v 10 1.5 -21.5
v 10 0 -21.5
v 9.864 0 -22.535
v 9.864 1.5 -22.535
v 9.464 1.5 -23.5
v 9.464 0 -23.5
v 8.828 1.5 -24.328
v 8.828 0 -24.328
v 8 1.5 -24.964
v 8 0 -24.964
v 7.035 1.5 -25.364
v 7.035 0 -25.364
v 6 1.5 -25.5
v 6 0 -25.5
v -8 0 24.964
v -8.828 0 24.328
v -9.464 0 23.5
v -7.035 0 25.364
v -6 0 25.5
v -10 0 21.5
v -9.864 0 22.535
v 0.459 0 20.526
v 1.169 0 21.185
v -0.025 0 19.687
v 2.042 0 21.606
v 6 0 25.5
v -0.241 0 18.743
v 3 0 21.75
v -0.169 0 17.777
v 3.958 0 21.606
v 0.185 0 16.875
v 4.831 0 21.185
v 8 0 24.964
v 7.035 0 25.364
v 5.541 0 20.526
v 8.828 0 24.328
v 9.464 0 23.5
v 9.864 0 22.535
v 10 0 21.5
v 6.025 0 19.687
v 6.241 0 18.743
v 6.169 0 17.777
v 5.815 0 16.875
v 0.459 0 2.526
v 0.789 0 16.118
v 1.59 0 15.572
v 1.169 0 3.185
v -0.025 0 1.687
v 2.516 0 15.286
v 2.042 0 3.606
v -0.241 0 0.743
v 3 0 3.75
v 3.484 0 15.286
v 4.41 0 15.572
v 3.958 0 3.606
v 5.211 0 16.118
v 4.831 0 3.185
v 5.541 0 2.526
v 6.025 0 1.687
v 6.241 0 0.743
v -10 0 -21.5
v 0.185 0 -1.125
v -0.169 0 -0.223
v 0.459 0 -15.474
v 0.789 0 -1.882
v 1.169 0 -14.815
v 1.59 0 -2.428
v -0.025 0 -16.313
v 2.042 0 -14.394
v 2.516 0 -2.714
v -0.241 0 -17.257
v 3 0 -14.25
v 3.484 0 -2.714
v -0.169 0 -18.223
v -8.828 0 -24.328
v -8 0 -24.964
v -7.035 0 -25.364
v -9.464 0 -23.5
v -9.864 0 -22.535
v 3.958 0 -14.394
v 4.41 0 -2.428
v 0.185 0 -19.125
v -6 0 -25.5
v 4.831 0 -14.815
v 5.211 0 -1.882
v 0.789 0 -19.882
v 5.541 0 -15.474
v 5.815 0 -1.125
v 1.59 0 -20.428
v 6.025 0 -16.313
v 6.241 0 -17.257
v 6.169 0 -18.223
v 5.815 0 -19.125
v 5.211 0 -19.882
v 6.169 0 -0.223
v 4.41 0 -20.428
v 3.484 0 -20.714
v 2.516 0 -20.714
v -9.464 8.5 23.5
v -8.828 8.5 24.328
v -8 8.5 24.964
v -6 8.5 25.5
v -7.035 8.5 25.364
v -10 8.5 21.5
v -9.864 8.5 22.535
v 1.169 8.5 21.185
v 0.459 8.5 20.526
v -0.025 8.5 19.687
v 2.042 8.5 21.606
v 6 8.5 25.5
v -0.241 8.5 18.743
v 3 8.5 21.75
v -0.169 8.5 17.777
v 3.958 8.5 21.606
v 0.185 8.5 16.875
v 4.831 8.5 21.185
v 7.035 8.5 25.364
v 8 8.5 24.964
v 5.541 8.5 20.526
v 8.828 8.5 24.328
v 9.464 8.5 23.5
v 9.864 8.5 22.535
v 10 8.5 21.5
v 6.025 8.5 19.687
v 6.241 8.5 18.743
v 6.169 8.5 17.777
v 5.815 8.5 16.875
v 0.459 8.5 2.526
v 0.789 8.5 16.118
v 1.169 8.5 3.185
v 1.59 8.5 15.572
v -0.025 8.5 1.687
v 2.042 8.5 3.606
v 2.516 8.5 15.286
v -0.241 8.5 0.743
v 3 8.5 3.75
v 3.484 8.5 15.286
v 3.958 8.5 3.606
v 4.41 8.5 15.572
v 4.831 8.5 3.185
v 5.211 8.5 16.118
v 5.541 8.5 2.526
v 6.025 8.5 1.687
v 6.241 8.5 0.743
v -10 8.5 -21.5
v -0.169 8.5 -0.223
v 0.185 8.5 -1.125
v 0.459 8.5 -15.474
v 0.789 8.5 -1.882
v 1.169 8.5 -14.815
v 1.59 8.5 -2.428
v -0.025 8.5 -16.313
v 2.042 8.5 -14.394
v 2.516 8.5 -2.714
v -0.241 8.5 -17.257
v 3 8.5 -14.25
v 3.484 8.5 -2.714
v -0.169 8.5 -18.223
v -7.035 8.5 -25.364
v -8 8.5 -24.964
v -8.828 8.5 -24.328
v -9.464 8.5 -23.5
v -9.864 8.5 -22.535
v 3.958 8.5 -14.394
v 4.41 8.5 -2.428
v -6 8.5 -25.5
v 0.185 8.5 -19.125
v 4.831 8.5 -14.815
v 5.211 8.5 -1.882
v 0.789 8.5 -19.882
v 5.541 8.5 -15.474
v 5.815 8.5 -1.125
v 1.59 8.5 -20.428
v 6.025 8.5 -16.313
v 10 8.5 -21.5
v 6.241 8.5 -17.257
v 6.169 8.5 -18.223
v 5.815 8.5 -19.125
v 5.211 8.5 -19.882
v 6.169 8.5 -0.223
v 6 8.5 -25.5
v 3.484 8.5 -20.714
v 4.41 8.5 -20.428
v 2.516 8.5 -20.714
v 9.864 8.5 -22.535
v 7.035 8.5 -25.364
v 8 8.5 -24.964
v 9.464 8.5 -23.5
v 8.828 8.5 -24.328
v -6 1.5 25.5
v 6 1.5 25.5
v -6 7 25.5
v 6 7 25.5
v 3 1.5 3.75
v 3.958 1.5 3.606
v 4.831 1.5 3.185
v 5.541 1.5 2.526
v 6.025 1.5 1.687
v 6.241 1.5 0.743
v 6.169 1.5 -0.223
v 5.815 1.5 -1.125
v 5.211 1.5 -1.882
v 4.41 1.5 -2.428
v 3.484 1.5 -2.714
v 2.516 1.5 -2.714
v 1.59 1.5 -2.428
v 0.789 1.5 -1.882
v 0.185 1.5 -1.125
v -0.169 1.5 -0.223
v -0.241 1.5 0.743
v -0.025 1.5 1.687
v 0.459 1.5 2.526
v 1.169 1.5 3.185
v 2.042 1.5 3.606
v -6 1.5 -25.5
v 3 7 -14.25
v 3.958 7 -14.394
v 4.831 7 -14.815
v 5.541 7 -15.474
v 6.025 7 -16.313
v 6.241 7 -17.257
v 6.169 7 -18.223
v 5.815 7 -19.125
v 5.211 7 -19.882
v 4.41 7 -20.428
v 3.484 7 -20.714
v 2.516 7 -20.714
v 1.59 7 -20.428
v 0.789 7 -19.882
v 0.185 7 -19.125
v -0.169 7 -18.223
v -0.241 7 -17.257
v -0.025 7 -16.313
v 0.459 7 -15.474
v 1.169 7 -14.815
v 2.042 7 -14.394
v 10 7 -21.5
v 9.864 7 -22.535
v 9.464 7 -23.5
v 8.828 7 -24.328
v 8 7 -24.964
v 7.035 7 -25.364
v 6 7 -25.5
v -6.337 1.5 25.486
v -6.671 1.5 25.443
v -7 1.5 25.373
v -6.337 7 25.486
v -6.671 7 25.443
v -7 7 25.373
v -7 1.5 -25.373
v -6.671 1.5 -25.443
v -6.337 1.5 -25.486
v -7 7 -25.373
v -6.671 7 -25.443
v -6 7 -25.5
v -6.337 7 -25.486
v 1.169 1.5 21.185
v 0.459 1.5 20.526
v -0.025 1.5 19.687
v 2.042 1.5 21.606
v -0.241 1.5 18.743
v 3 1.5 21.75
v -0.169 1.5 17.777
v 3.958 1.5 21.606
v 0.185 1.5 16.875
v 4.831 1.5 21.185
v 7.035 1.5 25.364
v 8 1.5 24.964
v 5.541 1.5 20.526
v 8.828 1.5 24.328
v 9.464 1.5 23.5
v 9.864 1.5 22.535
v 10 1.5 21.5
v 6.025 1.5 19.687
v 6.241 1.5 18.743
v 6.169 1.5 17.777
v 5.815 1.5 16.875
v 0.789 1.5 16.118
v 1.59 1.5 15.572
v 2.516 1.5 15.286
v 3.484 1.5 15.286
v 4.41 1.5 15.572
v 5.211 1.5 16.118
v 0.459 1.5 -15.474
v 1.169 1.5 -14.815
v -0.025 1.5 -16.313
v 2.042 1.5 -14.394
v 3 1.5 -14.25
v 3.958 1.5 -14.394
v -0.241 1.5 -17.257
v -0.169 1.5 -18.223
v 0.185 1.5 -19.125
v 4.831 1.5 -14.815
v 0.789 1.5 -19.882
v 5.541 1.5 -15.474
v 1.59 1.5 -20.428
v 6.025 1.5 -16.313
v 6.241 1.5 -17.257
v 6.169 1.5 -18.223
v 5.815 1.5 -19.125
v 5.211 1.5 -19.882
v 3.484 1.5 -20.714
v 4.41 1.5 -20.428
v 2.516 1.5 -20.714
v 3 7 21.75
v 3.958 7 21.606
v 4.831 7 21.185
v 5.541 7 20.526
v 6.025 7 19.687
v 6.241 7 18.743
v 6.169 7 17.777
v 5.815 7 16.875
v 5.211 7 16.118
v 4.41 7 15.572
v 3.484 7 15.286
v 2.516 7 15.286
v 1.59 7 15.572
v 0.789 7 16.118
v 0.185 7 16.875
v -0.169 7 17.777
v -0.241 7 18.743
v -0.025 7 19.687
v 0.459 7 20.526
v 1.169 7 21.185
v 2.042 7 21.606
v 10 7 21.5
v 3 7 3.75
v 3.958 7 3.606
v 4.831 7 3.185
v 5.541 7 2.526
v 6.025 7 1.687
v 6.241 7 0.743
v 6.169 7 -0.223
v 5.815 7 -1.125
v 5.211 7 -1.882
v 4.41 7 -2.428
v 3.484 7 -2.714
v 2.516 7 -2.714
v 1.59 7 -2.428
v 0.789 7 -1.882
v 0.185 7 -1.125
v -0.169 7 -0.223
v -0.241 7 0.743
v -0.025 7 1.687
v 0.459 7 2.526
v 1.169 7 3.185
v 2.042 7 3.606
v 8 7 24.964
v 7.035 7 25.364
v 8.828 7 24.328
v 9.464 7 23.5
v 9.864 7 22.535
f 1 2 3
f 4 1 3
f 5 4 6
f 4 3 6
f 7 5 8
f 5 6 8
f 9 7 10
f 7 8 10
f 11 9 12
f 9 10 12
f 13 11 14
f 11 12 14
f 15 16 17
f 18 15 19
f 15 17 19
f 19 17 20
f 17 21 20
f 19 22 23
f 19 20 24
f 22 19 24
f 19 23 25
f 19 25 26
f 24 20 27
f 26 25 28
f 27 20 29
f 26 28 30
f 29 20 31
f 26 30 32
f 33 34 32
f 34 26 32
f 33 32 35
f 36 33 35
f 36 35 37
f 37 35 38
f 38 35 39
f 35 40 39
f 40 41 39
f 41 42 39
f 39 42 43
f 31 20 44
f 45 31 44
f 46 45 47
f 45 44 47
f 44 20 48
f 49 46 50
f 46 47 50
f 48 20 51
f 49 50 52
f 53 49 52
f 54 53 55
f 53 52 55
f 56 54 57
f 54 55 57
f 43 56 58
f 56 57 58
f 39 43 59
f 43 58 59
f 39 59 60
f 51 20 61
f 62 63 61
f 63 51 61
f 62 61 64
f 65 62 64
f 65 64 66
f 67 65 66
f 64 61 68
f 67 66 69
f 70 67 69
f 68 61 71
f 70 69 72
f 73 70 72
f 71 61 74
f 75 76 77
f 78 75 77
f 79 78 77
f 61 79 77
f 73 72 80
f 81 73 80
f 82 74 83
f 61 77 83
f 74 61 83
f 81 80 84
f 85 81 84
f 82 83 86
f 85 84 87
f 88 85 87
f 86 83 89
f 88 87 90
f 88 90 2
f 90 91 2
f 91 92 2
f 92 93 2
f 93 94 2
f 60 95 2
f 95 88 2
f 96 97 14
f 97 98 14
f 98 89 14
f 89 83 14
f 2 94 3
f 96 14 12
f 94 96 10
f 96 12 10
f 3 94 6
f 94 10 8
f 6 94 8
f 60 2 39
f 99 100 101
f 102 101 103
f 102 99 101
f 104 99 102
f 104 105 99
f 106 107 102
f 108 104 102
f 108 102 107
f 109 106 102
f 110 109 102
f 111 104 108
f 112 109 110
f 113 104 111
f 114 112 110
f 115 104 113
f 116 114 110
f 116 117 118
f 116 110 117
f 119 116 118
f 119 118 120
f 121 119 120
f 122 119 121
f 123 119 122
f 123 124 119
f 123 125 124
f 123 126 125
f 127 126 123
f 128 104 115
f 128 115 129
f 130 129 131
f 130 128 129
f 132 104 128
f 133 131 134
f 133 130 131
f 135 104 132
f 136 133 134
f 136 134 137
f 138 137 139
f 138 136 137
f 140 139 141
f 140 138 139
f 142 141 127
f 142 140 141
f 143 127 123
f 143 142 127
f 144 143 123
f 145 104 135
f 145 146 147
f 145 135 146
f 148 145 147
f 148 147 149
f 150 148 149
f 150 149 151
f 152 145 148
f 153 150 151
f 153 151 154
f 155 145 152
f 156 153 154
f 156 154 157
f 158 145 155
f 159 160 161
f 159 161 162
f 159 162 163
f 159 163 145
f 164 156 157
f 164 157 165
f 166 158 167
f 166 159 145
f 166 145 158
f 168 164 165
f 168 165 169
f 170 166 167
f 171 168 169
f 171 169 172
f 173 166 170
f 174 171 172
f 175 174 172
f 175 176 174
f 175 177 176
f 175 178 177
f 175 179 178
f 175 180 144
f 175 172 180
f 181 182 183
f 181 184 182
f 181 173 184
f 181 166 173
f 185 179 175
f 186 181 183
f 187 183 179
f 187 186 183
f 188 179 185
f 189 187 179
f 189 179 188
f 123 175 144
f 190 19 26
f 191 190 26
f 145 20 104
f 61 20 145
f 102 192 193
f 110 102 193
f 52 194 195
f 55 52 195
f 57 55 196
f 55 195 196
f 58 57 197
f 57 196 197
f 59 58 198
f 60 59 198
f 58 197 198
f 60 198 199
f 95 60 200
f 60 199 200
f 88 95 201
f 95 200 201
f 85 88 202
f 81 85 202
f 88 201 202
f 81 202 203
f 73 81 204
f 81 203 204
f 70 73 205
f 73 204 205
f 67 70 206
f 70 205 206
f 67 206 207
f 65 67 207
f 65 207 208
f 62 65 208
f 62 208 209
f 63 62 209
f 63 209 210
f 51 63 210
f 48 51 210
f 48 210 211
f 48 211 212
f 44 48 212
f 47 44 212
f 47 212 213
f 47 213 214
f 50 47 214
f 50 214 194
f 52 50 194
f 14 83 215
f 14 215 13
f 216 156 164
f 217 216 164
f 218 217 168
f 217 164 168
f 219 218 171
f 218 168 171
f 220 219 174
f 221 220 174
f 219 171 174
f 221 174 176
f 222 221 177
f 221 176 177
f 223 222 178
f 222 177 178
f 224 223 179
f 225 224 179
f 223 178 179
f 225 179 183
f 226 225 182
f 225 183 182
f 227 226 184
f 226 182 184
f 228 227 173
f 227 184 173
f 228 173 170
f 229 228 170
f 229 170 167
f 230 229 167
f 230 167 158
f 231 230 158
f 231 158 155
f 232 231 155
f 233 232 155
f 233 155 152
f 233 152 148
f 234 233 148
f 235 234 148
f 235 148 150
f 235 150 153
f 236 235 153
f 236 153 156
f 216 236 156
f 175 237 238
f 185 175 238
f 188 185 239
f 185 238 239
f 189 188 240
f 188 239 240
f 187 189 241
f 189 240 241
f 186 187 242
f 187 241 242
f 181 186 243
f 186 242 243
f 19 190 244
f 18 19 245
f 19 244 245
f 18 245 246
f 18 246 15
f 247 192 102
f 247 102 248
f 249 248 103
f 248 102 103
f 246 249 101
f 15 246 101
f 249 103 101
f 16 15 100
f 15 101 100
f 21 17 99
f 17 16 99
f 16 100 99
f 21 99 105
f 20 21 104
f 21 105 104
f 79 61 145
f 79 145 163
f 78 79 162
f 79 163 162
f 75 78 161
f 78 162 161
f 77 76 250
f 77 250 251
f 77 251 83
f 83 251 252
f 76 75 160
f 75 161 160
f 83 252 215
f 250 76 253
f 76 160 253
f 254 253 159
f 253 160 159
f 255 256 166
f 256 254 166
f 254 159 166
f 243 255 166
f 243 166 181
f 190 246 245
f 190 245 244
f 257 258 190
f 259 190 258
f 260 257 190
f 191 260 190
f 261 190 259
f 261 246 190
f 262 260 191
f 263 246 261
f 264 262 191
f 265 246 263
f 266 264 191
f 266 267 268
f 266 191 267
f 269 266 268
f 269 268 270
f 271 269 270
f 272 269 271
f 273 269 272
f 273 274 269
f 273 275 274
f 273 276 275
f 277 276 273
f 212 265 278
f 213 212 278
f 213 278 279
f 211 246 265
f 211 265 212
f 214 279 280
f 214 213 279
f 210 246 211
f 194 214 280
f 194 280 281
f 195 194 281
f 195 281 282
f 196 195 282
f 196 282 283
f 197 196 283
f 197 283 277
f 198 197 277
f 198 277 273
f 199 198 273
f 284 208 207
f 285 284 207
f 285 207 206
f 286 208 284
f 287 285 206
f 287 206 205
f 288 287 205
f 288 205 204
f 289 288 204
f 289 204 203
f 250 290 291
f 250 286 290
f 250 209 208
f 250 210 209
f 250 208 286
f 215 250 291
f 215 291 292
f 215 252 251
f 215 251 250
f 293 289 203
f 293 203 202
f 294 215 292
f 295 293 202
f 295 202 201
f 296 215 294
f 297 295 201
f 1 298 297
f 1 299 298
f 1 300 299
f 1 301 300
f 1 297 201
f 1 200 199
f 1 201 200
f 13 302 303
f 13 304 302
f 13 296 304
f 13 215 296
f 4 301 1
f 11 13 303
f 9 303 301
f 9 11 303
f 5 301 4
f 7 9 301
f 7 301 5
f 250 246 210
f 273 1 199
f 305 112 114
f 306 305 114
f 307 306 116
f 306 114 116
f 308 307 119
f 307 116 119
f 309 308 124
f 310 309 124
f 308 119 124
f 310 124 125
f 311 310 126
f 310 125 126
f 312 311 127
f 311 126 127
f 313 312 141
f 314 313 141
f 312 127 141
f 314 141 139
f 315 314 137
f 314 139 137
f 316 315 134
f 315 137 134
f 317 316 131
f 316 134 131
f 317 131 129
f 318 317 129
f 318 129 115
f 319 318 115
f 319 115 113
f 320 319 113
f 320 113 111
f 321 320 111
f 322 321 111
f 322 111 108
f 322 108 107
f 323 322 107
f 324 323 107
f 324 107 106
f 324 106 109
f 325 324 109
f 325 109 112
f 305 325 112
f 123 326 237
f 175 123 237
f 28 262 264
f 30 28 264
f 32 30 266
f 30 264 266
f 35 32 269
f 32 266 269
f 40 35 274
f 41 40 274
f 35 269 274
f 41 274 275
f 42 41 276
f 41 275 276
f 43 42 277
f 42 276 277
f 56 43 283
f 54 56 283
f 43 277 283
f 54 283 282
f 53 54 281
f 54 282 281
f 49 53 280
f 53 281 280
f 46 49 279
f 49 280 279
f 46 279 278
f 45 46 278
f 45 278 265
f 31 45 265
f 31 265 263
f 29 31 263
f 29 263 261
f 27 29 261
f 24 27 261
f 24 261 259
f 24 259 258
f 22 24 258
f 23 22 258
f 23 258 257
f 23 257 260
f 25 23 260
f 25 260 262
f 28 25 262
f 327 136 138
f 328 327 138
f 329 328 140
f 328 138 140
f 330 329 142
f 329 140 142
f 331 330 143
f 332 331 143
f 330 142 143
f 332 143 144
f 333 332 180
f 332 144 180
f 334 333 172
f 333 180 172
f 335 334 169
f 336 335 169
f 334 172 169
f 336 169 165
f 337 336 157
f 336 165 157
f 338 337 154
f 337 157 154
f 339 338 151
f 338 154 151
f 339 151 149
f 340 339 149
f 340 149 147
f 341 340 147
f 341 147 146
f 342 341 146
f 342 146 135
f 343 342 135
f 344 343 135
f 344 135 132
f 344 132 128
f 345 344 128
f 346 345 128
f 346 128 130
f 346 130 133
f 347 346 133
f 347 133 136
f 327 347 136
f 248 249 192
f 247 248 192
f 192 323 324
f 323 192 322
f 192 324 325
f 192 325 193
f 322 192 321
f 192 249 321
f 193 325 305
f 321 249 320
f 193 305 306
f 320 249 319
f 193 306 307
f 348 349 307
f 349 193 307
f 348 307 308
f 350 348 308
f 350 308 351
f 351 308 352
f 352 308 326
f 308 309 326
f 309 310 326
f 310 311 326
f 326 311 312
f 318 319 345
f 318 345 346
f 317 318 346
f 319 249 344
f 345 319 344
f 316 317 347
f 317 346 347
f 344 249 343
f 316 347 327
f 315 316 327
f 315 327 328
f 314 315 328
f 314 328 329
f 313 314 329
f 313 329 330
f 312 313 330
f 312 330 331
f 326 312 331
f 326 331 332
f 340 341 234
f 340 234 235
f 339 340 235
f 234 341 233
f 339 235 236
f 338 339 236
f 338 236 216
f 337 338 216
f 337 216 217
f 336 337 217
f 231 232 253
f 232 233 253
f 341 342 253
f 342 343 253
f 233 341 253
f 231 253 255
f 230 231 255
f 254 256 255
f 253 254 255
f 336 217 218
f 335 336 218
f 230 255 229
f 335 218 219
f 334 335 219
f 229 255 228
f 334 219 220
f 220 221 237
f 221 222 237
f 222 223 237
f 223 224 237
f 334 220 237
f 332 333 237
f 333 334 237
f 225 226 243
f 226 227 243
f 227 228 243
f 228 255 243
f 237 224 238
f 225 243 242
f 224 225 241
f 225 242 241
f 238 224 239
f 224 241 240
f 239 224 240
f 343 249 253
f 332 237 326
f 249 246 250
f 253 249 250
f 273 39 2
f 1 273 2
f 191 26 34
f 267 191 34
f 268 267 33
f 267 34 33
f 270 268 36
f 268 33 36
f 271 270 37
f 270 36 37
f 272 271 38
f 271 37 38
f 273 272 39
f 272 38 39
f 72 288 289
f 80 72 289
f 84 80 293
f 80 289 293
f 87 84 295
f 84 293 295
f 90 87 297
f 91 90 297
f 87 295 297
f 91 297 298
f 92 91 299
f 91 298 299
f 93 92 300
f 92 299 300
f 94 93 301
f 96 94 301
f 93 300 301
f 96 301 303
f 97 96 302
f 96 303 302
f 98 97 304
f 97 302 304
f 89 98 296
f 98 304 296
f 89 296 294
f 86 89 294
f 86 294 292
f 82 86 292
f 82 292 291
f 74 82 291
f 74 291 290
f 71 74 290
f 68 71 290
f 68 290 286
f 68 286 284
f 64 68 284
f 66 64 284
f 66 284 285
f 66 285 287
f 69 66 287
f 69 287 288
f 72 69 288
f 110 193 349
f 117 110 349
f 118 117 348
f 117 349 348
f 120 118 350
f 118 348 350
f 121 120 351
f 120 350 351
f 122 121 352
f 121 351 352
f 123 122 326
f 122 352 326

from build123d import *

# Parameters (mm, degrees)
SKETCH1_W           = 20
SKETCH1_H           = 51
BOSS_EXTRUDE1_DEPTH = 1.5
SKETCH2_W           = 3
SKETCH2_H           = 51
BOSS_EXTRUDE2_DEPTH = 5.5
SKETCH3_W           = 20
SKETCH3_H           = 51
BOSS_EXTRUDE3_DEPTH = 1.5
SKETCH4_R           = 3.25
CUT_EXTRUDE1_DEPTH  = 15
FILLET1_R           = 4


with BuildPart() as part:
    # Sketch1 → Boss-Extrude1 (new body)
    with BuildSketch(Plane(origin=(0, 0, 0), x_dir=(1, 0, 0), z_dir=(0, 1, 0))):
        Rectangle(SKETCH1_W, SKETCH1_H)
    extrude(amount=BOSS_EXTRUDE1_DEPTH)

    # Sketch2 → Boss-Extrude2 (add)
    with BuildSketch(Plane(origin=(0, 1.5, 0), x_dir=(1, 0, 0), z_dir=(0, 1, 0))):
        with Locations((-8.5, 0)):
            Rectangle(SKETCH2_W, SKETCH2_H)
    extrude(amount=BOSS_EXTRUDE2_DEPTH)

    # Sketch3 → Boss-Extrude3 (add)
    with BuildSketch(Plane(origin=(0, 7, 0), x_dir=(1, 0, 0), z_dir=(0, 1, 0))):
        Rectangle(SKETCH3_W, SKETCH3_H)
    extrude(amount=BOSS_EXTRUDE3_DEPTH)

    # Sketch4 → Cut-Extrude1 (cut)
    with BuildSketch(Plane(origin=(0, 8.5, 0), x_dir=(1, 0, 0), z_dir=(0, 1, 0))):
        with Locations(Location((3, 17.5, 0), (0, 0, 270))):
            Circle(SKETCH4_R)
        with Locations(Location((3, -0.5, 0), (0, 0, 270))):
            Circle(SKETCH4_R)
        with Locations(Location((3, -18.5, 0), (0, 0, 270))):
            Circle(SKETCH4_R)
    extrude(amount=-CUT_EXTRUDE1_DEPTH, mode=Mode.SUBTRACT)

    # Fillet1
    # the kernel refuses this fillet: 4 mm, written as the material it takes off along each edge
    with BuildSketch(Plane(origin=(-10, 18.5, 25.5), x_dir=(1, 0, 0), z_dir=(0, -1, 0)), Plane(origin=(-10, 18.5, -25.5), x_dir=(0, 0, 1), z_dir=(0, -1, 0))) as fillet1_piece_1:
        with BuildLine():
            CenterArc((FILLET1_R, -FILLET1_R), FILLET1_R, 90, 90)
            Line((0, -FILLET1_R), (0, 0))
            Line((0, 0), (FILLET1_R, 0))
        make_face()
    extrude(amount=28.5, mode=Mode.SUBTRACT)
    with BuildSketch(Plane(origin=(10, -10, 25.5), x_dir=(-1, 0, 0), z_dir=(0, 1, 0)), Plane(origin=(10, -3, 25.5), x_dir=(-1, 0, 0), z_dir=(0, 1, 0)), Plane(origin=(10, -10, -25.5), x_dir=(0, 0, 1), z_dir=(0, 1, 0)), Plane(origin=(10, -3, -25.5), x_dir=(0, 0, 1), z_dir=(0, 1, 0))) as fillet1_piece_2:
        with BuildLine():
            CenterArc((FILLET1_R, -FILLET1_R), FILLET1_R, 90, 90)
            Line((0, -FILLET1_R), (0, 0))
            Line((0, 0), (FILLET1_R, 0))
        make_face()
    extrude(amount=21.5, mode=Mode.SUBTRACT)


solid = part.part
